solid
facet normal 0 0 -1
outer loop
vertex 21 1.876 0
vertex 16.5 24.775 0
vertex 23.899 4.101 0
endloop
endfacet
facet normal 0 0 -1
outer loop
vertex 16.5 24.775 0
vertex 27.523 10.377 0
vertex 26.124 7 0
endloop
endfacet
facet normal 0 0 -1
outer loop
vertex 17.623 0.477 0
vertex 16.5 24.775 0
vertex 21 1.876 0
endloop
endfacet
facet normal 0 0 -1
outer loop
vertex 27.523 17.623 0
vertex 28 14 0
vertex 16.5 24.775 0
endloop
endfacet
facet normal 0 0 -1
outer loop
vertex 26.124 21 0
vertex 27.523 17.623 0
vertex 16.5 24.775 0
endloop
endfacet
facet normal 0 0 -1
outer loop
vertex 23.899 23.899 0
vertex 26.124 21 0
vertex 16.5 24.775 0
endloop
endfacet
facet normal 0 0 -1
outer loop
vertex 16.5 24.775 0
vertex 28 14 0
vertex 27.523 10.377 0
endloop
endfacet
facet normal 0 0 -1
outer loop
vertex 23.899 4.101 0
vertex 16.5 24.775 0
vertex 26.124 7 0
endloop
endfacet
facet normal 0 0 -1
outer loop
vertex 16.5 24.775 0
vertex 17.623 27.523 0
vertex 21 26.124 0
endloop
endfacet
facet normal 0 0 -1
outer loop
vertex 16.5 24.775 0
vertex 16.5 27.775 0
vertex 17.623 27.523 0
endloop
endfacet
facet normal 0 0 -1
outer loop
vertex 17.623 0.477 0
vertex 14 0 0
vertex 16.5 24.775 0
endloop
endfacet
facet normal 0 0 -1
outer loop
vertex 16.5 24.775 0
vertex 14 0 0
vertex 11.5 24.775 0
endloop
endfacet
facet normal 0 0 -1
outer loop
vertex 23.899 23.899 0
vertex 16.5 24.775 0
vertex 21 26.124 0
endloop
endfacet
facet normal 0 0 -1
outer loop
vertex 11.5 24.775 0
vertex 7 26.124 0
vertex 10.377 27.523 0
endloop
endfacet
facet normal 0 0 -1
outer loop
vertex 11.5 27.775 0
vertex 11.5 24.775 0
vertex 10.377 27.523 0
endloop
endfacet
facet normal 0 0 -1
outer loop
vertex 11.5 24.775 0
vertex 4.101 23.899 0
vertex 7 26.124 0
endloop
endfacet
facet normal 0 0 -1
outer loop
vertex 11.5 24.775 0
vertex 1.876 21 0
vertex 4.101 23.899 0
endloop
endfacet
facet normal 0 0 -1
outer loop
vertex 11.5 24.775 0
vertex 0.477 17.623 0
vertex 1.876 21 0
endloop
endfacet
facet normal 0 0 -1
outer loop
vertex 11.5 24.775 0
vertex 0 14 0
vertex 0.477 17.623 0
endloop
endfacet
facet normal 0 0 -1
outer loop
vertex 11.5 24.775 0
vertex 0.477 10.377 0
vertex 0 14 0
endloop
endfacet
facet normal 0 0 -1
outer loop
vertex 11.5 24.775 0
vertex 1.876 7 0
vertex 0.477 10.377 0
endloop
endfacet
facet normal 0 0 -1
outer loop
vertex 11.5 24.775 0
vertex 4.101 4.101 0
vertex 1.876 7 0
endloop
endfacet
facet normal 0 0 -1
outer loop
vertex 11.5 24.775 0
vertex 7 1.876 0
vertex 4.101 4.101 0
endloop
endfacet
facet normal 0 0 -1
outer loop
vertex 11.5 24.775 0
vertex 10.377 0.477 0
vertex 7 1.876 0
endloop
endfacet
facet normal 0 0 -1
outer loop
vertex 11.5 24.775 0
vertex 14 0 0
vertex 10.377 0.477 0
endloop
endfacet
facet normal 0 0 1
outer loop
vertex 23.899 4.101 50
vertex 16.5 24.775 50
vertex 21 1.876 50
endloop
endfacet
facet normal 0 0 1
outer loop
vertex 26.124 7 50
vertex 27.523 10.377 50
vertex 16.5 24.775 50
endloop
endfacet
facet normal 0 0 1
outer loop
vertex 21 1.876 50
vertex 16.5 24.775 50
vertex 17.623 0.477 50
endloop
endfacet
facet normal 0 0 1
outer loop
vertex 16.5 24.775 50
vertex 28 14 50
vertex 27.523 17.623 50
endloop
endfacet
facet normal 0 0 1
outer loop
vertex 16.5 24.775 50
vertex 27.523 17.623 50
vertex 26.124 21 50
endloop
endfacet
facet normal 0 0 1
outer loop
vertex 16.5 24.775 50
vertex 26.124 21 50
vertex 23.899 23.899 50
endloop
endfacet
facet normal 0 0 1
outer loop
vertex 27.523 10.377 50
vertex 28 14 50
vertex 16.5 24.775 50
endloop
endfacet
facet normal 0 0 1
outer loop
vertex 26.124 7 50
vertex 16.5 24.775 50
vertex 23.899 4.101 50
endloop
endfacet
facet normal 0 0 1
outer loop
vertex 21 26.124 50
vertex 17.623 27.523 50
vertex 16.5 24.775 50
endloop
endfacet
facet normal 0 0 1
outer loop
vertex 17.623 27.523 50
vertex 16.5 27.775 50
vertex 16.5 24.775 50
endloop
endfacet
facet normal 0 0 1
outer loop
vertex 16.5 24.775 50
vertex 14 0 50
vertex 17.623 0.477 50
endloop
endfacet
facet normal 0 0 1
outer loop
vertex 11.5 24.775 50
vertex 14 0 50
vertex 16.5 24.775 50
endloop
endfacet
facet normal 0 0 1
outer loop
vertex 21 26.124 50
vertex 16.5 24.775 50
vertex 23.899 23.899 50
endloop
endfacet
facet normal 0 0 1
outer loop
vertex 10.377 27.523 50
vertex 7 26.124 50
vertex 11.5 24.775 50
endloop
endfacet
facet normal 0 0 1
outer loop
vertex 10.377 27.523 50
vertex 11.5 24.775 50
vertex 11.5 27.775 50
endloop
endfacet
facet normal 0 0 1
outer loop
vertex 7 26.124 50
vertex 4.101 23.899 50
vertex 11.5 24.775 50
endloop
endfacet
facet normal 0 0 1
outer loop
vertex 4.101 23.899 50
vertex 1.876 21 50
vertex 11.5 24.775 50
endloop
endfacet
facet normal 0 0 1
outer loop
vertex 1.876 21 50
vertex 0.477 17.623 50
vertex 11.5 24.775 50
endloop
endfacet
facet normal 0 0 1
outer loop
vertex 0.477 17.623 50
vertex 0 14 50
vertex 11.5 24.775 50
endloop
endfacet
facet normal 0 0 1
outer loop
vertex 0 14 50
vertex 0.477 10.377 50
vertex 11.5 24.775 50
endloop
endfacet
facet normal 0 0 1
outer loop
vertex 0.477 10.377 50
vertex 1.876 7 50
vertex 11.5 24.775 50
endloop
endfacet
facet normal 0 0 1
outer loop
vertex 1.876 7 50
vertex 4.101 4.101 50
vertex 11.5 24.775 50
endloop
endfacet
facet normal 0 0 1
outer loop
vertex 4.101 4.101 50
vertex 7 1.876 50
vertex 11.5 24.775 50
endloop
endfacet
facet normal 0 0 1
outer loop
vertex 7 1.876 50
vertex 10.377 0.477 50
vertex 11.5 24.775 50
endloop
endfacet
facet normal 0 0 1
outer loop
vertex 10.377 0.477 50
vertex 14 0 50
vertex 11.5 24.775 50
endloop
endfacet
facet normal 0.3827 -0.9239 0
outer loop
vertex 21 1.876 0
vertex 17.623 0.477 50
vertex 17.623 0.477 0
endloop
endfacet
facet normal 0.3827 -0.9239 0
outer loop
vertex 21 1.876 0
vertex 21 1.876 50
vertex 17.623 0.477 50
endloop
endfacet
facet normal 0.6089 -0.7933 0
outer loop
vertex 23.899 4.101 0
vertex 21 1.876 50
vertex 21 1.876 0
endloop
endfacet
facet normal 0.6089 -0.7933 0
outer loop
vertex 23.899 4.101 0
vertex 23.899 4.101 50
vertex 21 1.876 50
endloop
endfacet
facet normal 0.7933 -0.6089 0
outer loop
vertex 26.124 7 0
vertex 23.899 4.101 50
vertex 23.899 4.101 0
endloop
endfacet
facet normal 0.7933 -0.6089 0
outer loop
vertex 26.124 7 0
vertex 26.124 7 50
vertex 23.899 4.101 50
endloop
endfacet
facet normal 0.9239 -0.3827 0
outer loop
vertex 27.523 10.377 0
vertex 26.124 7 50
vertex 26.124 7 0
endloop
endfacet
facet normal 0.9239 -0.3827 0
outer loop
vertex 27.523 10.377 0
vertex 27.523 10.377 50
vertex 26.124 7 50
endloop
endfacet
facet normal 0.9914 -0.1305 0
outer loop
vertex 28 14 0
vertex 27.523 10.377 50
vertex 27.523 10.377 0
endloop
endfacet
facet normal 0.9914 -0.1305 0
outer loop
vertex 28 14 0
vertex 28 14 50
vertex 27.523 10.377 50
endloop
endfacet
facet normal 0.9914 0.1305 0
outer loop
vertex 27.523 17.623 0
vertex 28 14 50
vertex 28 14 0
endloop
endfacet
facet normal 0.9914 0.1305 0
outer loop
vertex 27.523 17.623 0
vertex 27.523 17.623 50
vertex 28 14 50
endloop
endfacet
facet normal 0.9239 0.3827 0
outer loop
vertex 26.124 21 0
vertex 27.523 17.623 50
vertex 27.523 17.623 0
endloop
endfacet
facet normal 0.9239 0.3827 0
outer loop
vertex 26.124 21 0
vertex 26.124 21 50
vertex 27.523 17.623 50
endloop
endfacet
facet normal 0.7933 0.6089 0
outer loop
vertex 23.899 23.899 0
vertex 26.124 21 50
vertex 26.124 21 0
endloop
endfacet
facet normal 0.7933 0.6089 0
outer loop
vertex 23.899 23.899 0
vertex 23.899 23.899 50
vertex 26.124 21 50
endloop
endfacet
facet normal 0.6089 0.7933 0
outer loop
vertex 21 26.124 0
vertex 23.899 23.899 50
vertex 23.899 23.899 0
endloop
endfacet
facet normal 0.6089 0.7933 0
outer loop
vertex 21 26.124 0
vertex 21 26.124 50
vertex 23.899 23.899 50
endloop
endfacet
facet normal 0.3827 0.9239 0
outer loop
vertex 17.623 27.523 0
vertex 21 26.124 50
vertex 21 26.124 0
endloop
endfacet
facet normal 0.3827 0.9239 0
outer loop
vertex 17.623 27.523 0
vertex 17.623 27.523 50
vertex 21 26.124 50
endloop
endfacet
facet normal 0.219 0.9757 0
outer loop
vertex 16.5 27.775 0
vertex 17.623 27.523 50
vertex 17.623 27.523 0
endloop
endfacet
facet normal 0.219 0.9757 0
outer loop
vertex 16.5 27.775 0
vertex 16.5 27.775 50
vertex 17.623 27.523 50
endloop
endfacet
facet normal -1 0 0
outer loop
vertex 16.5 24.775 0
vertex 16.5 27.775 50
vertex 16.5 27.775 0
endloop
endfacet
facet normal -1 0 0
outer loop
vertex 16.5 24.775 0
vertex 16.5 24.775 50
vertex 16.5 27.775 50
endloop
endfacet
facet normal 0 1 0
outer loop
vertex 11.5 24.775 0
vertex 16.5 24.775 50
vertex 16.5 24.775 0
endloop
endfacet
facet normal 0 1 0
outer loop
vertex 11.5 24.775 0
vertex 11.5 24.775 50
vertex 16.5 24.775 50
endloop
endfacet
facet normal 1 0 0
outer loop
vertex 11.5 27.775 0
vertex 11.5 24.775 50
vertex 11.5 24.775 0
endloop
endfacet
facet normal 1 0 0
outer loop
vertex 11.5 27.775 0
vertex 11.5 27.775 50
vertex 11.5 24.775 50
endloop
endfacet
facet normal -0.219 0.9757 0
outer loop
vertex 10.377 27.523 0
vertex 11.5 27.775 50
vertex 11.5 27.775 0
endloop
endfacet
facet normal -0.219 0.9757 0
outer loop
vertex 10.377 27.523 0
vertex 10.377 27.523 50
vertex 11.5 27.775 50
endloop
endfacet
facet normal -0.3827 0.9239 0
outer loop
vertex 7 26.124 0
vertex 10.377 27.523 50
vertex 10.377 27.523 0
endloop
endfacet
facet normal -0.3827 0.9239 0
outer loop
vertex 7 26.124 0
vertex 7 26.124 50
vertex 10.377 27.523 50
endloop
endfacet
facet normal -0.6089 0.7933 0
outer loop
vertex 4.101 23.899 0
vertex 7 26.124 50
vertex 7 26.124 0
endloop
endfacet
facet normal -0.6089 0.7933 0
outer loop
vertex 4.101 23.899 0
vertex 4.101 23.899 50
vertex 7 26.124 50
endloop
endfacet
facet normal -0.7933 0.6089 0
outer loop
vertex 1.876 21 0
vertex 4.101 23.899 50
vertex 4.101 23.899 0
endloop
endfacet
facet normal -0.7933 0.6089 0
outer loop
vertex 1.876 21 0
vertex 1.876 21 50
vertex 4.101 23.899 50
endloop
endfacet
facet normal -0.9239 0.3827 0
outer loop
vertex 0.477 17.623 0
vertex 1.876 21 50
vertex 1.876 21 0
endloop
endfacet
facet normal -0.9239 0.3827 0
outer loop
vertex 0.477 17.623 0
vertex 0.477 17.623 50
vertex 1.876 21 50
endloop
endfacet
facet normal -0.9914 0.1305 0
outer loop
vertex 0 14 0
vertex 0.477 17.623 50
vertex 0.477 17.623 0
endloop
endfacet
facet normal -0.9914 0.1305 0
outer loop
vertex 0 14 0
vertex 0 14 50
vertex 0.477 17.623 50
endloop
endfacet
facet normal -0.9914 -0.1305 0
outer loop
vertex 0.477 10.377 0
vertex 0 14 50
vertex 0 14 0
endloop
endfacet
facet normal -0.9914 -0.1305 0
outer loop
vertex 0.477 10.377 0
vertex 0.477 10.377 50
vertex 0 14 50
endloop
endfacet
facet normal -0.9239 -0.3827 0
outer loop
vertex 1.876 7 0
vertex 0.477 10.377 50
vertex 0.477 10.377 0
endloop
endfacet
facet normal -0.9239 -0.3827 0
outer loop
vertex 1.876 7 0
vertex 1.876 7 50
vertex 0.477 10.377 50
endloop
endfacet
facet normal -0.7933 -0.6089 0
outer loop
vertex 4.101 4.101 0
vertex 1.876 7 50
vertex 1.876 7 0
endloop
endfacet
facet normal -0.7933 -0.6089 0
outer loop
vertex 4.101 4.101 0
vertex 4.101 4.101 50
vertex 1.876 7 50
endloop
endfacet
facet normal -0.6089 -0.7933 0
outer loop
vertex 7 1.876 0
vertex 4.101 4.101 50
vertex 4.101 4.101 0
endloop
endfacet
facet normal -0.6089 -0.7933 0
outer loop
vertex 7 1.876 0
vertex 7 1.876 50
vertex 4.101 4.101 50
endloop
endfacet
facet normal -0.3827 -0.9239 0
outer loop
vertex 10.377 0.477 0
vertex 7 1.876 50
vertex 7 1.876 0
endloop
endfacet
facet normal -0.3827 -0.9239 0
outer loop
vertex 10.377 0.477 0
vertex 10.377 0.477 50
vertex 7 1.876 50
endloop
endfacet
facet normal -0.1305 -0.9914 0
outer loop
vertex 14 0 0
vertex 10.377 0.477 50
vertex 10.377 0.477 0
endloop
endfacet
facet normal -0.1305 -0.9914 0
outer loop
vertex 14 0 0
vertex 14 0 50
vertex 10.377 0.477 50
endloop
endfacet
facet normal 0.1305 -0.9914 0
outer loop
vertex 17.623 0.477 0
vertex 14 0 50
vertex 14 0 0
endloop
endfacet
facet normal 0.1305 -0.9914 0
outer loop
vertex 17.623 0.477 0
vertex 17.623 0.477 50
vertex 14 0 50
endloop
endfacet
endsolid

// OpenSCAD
$fn = 32;

// ----------------------------------------------------------------------
// Keyway shaft: d28 shaft, key 5 x 3 mm
// ----------------------------------------------------------------------

// --- parameters (mm) ---
shaft_r = 14;             // shaft radius
key_w = 5;                // keyway width
key_d = 3;                // keyway depth below the surface line
plate_t = 50;             // shaft length, Z (extrusion height)

shaft_d = 2 * shaft_r;  // shaft diameter
circle_step = 15;  // polygon sampling step, degrees

profile = [[10.377, 27.523], [7, 26.124], [4.101, 23.899], [1.876, 21], [0.477, 17.623], [0, 14], [0.477, 10.377], [1.876, 7], [4.101, 4.101], [7, 1.876], [10.377, 0.477], [14, 0], [17.623, 0.477], [21, 1.876], [23.899, 4.101], [26.124, 7], [27.523, 10.377], [28, 14], [27.523, 17.623], [26.124, 21], [23.899, 23.899], [21, 26.124], [17.623, 27.523], [16.5, 27.775], [16.5, 24.775], [11.5, 24.775], [11.5, 27.775]];  // primary outline, 27 points, counter clockwise

// --- the one profile operation ---
linear_extrude(height = plate_t) polygon(points = profile);
